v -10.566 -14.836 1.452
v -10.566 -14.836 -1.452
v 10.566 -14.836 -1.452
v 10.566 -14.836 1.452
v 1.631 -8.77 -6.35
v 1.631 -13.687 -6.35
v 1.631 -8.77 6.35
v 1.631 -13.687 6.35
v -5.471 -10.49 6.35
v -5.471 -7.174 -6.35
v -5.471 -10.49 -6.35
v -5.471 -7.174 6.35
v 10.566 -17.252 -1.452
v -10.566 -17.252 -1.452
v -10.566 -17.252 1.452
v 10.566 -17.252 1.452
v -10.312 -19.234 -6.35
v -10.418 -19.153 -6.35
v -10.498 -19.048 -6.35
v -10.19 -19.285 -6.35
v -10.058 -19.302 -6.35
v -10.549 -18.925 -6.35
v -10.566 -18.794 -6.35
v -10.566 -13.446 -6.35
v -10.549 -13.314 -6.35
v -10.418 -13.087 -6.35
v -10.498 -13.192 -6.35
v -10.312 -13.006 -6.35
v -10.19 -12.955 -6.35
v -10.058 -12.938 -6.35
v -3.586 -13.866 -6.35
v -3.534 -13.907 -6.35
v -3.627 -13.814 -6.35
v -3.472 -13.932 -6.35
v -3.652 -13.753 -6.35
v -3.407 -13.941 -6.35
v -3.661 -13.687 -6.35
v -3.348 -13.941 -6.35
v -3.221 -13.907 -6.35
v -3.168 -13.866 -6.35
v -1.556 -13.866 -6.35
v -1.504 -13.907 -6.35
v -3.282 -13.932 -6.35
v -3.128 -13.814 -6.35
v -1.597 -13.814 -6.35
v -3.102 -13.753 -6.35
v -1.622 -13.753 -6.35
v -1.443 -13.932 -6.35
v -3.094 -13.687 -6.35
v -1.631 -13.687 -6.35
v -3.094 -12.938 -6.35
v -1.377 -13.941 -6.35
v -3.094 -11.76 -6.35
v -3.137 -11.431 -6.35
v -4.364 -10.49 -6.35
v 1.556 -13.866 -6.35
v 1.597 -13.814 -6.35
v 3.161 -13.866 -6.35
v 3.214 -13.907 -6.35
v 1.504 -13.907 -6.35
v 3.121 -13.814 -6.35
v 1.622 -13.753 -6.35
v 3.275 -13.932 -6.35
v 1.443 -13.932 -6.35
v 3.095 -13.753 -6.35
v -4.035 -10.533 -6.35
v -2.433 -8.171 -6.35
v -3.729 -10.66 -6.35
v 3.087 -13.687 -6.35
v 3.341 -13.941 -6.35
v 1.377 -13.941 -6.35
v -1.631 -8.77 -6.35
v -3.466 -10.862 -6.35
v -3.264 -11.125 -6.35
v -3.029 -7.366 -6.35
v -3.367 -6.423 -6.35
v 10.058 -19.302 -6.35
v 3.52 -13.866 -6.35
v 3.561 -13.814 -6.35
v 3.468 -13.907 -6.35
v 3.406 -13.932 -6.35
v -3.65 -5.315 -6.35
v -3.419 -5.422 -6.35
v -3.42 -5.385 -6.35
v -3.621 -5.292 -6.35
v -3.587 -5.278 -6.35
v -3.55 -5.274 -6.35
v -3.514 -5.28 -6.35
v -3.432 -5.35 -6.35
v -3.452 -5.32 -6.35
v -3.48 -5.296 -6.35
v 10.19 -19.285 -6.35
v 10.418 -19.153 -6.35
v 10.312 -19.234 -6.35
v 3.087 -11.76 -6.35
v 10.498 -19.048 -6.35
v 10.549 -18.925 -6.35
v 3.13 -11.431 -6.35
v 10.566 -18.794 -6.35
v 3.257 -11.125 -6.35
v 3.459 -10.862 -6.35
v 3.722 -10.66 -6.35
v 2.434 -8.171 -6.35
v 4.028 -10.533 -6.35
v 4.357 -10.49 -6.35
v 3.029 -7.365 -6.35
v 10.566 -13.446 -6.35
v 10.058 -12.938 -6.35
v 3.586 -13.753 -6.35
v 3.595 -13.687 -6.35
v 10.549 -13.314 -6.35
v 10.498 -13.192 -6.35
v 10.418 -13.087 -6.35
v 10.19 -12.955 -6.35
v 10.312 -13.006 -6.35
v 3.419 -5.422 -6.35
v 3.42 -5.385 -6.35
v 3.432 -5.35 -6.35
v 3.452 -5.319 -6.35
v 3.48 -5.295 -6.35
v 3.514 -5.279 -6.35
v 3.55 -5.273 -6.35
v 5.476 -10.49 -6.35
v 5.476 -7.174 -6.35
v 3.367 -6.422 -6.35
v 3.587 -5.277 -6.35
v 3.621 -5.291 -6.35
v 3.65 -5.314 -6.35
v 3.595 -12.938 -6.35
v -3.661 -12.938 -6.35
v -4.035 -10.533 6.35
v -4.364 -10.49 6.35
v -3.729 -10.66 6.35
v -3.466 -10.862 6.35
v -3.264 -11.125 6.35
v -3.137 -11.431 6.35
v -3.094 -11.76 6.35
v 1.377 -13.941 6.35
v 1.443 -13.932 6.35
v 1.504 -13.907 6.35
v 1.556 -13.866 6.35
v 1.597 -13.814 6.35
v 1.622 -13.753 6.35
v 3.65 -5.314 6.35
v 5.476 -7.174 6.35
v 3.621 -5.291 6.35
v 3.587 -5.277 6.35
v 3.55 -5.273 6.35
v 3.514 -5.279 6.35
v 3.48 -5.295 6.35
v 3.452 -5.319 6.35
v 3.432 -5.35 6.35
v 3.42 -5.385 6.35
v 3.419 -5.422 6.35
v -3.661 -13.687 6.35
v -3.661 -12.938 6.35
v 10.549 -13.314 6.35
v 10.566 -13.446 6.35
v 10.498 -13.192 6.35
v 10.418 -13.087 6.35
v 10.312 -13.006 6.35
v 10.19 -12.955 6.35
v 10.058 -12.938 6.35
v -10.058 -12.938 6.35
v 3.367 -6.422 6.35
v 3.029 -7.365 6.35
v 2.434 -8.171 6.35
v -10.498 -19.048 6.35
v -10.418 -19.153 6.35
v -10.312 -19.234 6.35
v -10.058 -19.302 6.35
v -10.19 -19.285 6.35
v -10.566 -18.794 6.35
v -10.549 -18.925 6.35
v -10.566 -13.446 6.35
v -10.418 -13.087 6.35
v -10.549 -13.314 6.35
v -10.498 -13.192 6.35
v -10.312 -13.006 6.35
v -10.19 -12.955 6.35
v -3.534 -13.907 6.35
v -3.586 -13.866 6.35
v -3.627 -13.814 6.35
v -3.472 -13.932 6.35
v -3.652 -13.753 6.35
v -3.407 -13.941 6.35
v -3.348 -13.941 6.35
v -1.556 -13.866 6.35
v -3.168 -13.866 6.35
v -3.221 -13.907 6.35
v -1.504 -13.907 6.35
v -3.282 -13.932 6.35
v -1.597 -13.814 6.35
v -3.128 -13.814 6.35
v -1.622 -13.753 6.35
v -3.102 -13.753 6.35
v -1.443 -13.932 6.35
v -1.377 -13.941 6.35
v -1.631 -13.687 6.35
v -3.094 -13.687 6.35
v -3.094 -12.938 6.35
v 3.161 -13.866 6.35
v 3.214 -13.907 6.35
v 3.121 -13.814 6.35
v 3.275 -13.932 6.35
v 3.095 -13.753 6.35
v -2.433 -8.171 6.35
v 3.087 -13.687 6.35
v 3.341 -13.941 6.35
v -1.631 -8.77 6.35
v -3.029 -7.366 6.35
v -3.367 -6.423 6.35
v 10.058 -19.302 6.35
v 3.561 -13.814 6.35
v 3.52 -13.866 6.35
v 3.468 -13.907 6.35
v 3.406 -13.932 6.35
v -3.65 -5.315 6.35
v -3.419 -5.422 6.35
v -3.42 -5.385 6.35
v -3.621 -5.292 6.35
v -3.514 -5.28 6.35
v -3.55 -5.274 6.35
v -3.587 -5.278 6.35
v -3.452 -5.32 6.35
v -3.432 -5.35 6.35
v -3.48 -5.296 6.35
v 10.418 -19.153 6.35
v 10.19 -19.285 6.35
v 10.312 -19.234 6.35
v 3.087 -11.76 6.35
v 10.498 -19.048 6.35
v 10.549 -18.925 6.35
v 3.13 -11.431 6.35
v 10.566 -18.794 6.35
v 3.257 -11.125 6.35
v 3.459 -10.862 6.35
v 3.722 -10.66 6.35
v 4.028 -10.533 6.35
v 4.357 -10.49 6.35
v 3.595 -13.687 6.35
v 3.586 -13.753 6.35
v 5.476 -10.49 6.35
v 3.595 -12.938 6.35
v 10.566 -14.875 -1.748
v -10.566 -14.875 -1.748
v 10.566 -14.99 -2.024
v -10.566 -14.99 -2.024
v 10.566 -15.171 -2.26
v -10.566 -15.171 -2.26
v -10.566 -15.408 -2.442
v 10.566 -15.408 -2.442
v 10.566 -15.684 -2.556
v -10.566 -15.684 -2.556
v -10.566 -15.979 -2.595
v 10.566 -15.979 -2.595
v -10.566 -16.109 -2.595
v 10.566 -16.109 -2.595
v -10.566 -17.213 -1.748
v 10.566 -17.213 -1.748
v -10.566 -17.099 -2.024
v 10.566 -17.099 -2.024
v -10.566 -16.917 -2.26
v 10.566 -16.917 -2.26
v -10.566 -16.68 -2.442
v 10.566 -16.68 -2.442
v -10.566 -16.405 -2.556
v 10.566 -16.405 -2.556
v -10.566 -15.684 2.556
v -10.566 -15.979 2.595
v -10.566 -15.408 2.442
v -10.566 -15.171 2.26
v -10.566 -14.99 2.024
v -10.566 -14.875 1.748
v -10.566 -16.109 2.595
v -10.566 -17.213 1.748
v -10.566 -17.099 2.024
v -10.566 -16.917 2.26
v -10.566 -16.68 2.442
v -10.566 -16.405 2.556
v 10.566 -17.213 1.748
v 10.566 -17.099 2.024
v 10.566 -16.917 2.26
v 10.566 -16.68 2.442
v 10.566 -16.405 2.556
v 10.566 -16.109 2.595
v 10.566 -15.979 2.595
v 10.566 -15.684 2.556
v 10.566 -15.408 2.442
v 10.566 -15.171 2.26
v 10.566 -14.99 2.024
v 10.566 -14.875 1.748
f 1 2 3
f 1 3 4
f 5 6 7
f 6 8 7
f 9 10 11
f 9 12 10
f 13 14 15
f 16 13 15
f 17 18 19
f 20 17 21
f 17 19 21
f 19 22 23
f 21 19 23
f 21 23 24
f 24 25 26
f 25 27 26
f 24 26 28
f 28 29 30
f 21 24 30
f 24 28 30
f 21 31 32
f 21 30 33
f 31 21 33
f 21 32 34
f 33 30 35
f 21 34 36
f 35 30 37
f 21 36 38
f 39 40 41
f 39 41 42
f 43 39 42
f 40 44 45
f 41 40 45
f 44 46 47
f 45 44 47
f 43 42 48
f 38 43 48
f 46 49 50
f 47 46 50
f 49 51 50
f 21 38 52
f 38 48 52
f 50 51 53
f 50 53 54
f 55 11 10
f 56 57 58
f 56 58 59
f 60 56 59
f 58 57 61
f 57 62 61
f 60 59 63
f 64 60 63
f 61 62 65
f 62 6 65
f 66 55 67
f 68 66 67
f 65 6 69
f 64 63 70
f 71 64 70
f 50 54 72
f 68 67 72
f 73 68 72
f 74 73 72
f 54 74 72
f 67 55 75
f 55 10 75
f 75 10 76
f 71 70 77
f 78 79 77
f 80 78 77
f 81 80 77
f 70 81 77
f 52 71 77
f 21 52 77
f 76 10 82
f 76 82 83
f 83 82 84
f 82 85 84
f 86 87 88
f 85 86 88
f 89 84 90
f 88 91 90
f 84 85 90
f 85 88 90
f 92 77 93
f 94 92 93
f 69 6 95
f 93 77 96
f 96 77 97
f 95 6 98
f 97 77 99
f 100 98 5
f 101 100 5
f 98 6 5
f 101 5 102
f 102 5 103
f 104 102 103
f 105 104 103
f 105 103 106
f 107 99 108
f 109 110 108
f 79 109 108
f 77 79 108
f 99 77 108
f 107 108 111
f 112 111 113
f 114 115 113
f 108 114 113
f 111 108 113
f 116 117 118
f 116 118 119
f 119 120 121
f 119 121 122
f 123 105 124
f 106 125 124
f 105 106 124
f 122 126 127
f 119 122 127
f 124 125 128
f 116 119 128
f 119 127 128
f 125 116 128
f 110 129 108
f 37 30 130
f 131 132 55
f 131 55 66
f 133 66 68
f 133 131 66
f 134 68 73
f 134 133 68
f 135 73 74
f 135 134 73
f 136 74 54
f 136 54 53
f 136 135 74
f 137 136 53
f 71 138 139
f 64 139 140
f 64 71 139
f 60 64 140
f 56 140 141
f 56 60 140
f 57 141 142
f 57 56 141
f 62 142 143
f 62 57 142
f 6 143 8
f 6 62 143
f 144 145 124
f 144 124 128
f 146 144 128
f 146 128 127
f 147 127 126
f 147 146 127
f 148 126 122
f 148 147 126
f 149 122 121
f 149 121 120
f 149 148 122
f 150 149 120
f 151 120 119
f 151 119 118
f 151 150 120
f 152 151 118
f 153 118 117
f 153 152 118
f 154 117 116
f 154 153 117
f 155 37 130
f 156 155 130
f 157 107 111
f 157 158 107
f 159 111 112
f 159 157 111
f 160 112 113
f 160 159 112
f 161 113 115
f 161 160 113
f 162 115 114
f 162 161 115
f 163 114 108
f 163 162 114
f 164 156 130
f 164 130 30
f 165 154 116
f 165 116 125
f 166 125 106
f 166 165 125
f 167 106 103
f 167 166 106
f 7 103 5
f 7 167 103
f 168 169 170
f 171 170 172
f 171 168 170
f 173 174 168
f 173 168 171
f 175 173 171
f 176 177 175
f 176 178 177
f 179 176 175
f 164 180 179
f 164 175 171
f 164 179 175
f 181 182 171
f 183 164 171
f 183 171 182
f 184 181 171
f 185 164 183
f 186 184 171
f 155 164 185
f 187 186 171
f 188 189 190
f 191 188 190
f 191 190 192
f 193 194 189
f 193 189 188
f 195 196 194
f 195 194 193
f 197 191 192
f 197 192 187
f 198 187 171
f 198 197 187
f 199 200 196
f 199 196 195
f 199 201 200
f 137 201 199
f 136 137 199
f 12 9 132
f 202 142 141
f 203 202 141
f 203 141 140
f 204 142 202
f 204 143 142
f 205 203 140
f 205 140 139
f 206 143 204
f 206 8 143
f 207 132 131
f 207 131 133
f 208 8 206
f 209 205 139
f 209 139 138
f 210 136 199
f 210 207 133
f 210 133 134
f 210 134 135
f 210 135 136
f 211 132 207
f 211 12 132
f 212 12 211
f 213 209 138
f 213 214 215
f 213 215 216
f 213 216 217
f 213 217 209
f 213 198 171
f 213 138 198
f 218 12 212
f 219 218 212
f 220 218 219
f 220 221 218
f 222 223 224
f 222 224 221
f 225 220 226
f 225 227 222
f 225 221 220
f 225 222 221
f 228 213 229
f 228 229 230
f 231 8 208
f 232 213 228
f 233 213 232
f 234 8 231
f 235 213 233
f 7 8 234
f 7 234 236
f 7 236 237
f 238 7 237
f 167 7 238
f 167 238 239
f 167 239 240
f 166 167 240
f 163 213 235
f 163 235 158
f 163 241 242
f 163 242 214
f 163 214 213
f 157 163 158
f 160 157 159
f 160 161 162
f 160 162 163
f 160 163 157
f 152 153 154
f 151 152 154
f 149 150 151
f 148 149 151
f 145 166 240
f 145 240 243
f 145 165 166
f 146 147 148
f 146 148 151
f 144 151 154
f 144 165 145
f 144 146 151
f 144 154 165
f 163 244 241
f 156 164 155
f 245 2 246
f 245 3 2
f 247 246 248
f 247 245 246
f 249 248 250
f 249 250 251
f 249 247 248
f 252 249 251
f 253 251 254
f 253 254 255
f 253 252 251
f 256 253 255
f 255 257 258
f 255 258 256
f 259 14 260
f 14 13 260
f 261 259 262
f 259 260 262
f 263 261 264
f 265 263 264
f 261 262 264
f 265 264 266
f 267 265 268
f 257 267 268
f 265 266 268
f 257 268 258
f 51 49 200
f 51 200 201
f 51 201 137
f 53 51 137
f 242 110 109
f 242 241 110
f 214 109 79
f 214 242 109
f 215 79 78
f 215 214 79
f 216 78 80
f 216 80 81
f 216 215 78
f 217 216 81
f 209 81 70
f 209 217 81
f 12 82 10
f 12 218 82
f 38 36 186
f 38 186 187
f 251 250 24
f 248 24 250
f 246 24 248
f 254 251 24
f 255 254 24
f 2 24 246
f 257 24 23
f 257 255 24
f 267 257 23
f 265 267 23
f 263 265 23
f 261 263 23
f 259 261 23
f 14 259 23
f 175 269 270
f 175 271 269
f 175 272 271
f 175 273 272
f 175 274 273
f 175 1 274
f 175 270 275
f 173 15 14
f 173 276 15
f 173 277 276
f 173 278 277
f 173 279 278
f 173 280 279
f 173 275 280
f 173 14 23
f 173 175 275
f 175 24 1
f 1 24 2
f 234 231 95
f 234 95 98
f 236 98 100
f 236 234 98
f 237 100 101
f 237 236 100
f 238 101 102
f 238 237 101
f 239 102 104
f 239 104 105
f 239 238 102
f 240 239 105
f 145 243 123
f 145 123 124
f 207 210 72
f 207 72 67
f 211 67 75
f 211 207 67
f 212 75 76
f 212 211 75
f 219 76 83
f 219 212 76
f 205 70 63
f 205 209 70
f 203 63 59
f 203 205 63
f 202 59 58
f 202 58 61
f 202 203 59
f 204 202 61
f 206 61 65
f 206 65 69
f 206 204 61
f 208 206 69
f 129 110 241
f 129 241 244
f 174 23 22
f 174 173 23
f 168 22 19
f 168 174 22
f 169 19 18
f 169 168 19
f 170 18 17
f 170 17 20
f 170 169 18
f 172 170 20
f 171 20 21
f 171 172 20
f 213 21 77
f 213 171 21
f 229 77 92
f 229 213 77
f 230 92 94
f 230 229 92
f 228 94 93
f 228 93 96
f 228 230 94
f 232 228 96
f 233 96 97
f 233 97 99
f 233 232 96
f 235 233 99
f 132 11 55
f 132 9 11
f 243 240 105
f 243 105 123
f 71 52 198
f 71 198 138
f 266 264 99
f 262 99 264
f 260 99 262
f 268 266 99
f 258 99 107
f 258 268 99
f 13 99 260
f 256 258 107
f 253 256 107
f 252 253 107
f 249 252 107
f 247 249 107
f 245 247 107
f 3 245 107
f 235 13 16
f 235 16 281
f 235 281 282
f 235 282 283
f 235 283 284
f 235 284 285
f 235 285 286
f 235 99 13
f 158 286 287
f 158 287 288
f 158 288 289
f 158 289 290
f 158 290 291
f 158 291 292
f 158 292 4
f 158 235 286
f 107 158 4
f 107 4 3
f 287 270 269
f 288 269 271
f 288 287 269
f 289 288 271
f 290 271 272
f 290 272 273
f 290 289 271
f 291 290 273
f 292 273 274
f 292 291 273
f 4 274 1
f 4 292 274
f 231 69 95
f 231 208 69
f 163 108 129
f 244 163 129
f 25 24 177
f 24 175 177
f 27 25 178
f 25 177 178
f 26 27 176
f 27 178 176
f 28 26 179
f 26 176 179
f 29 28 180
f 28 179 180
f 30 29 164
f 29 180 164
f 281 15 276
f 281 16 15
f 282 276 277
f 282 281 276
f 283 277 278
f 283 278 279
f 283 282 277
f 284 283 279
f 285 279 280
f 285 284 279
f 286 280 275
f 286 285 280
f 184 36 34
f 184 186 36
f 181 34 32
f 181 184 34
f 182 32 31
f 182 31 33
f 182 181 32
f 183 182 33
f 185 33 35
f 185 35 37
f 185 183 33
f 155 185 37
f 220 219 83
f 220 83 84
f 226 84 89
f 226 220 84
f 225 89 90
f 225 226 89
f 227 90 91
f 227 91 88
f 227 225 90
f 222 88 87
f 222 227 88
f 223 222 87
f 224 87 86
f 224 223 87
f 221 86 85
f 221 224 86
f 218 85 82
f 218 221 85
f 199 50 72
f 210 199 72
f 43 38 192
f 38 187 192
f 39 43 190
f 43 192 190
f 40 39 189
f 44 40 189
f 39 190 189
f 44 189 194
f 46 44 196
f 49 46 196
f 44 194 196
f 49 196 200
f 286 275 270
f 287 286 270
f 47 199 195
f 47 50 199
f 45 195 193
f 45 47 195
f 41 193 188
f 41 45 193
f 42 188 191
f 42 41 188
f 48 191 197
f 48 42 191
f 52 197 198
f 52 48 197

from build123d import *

# Parameters (mm, degrees)
BOSS_EXTRUDE9_DEPTH      = 6.35
SKETCH4_W                = 3.261538064
SKETCH4_H                = 3.965348827
CUT_EXTRUDE2_DEPTH       = 26.406776986
SKETCH5_W                = 1.630769032
SKETCH5_H                = 1.267236454
CUT_EXTRUDE6_DEPTH       = 26.406776986
SKETCH6_W                = 1.630769032
SKETCH6_H                = 1.247570224
CUT_EXTRUDE7_DEPTH       = 26.406776986
CUT_EXTRUDE9_DEPTH       = 23.902768758
CUT_EXTRUDE9_DEPTH_BACK  = 23.902768758
SKETCH8_W                = 0.566855721
SKETCH8_H                = 1.002964872
CUT_EXTRUDE10_DEPTH      = 26.406776986
CUT_EXTRUDE10_DEPTH_BACK = 26.406776986
SKETCH9_W                = 0.508
SKETCH9_H                = 1.002964872
FILLET1_R                = 0.254
FILLET2_R                = 0.254
FILLET3_R                = 0.254
FILLET4_R                = 0.508
FILLET5_R                = 0.508
SKETCH11_W               = 5.19034067
SKETCH11_H               = 2.415254944
CUT_EXTRUDE11_DEPTH      = 30.316944626
FILLET6_R                = 1.143


with BuildPart() as part:
    # Sketch2 → Boss-Extrude9 (new, symmetric)
    with BuildSketch(Plane.XY):
        with BuildLine():
            Line((-5.471488307, -10.4902), (-4.36371454, -10.4902))
            ThreePointArc((-4.36371454, -10.4902), (-3.465688928, -10.862174388), (-3.09371454, -11.7602))
            Line((-3.09371454, -11.7602), (-3.09371454, -12.937827191))
            Line((-3.09371454, -12.937827191), (-10.566399977, -12.937827191))
            Line((-10.566399977, -12.937827191), (-10.566399977, -19.301956075))
            Line((-10.566399977, -19.301956075), (10.566399977, -19.301956075))
            Line((10.566399977, -19.301956075), (10.566399977, -12.937827191))
            Line((10.566399977, -12.937827191), (3.086674887, -12.937827191))
            Line((3.086674887, -12.937827191), (3.086674887, -11.7602))
            ThreePointArc((3.086674887, -11.7602), (3.458649275, -10.862174388), (4.356674887, -10.4902))
            Line((4.356674887, -10.4902), (5.476039751, -10.4902))
            Line((5.476039751, -10.4902), (5.476039751, -7.173536635))
            Line((5.476039751, -7.173536635), (3.650231899, -5.31386943))
            ThreePointArc((3.650231899, -5.31386943), (3.496357897, -5.285953607), (3.418648834, -5.421665813))
            ThreePointArc((3.418648834, -5.421665813), (0.00035136, -9.18188013), (-3.418715481, -5.422365367))
            ThreePointArc((-3.418715481, -5.422365367), (-3.496506609, -5.286643819), (-3.650404442, -5.314701882))
            Line((-3.650404442, -5.314701882), (-5.471488307, -7.173600332))
            Line((-5.471488307, -7.173600332), (-5.471488307, -10.4902))
        make_face()
    extrude(amount=BOSS_EXTRUDE9_DEPTH, both=True)

    # Sketch4 → Cut-Extrude2 (cut, through all)
    with BuildSketch(Plane.XY.offset(6.35)):
        with Locations((0, -11.95811765)):
            Rectangle(SKETCH4_W, SKETCH4_H)
    extrude(amount=-CUT_EXTRUDE2_DEPTH, mode=Mode.SUBTRACT)

    # Sketch5 → Cut-Extrude6 (cut, through all)
    with BuildSketch(Plane.XY.offset(6.35)):
        with Locations((-0.815384516, -9.341825009)):
            Rectangle(SKETCH5_W, SKETCH5_H)
    extrude(amount=-CUT_EXTRUDE6_DEPTH, mode=Mode.SUBTRACT)

    # Sketch6 → Cut-Extrude7 (cut, through all)
    with BuildSketch(Plane(origin=(0, 0, -6.35), x_dir=(-1, 0, 0), z_dir=(0, 0, -1))):
        with Locations((-0.815384516, -9.351658124)):
            Rectangle(SKETCH6_W, SKETCH6_H)
    extrude(amount=-CUT_EXTRUDE7_DEPTH, mode=Mode.SUBTRACT)

    # Sketch8 → Cut-Extrude9 (cut, two sides: drawn at the far end of the back side and taken through both)
    with BuildSketch(Plane.XY.offset(-CUT_EXTRUDE9_DEPTH_BACK)):
        with Locations((-3.377142401, -13.439309627)):
            Rectangle(SKETCH8_W, SKETCH8_H)
    extrude(amount=CUT_EXTRUDE9_DEPTH + CUT_EXTRUDE9_DEPTH_BACK, mode=Mode.SUBTRACT)

    # Sketch9 → Cut-Extrude10 (cut, two sides: drawn at the far end of the back side and taken through both)
    with BuildSketch(Plane.XY.offset(6.35).offset(-CUT_EXTRUDE10_DEPTH_BACK)):
        with Locations((3.340674887, -13.439309627)):
            Rectangle(SKETCH9_W, SKETCH9_H)
    extrude(amount=CUT_EXTRUDE10_DEPTH + CUT_EXTRUDE10_DEPTH_BACK, mode=Mode.SUBTRACT)

    # Fillet1
    fillet1_edges = [part.edges().sort_by_distance(p)[0] for p in [
        (-3.09371454, -13.940792063, 0),
    ]]
    fillet(fillet1_edges, radius=FILLET1_R)

    # Fillet2
    fillet2_edges = [part.edges().sort_by_distance(p)[0] for p in [
        (-3.660570261, -13.940792063, 0),
    ]]
    fillet(fillet2_edges, radius=FILLET2_R)

    # Fillet3
    fillet3_edges = [part.edges().sort_by_distance(p)[0] for p in [
        (3.594674887, -13.940792063, 0),
        (3.086674887, -13.940792063, 0),
        (1.630769032, -13.940792063, 0),
        (-1.630769032, -13.940792063, 0),
    ]]
    fillet(fillet3_edges, radius=FILLET3_R - 0.0001)  # a hair under: the kernel refuses the full size

    # Fillet4
    fillet4_edges = [part.edges().sort_by_distance(p)[0] for p in [
        (-10.566399977, -12.937827191, 0),
    ]]
    fillet(fillet4_edges, radius=FILLET4_R)

    # Fillet5
    fillet5_edges = [part.edges().sort_by_distance(p)[0] for p in [
        (-10.566399977, -19.301956075, 0),
        (10.566399977, -12.937827191, 0),
        (10.566399977, -19.301956075, 0),
    ]]
    fillet(fillet5_edges, radius=FILLET5_R)

    # Sketch11 → Cut-Extrude11 (cut, through all)
    with BuildSketch(Plane.ZY.offset(10.566399977)):
        with Locations((0, -16.044100378)):
            Rectangle(SKETCH11_W, SKETCH11_H)
    extrude(amount=-CUT_EXTRUDE11_DEPTH, mode=Mode.SUBTRACT)

    # Fillet6
    fillet6_edges = [part.edges().sort_by_distance(p)[0] for p in [
        (0, -14.836472906, 2.595170335),
        (0, -17.25172785, 2.595170335),
        (0, -17.25172785, -2.595170335),
        (0, -14.836472906, -2.595170335),
    ]]
    fillet(fillet6_edges, radius=FILLET6_R)


solid = part.part
